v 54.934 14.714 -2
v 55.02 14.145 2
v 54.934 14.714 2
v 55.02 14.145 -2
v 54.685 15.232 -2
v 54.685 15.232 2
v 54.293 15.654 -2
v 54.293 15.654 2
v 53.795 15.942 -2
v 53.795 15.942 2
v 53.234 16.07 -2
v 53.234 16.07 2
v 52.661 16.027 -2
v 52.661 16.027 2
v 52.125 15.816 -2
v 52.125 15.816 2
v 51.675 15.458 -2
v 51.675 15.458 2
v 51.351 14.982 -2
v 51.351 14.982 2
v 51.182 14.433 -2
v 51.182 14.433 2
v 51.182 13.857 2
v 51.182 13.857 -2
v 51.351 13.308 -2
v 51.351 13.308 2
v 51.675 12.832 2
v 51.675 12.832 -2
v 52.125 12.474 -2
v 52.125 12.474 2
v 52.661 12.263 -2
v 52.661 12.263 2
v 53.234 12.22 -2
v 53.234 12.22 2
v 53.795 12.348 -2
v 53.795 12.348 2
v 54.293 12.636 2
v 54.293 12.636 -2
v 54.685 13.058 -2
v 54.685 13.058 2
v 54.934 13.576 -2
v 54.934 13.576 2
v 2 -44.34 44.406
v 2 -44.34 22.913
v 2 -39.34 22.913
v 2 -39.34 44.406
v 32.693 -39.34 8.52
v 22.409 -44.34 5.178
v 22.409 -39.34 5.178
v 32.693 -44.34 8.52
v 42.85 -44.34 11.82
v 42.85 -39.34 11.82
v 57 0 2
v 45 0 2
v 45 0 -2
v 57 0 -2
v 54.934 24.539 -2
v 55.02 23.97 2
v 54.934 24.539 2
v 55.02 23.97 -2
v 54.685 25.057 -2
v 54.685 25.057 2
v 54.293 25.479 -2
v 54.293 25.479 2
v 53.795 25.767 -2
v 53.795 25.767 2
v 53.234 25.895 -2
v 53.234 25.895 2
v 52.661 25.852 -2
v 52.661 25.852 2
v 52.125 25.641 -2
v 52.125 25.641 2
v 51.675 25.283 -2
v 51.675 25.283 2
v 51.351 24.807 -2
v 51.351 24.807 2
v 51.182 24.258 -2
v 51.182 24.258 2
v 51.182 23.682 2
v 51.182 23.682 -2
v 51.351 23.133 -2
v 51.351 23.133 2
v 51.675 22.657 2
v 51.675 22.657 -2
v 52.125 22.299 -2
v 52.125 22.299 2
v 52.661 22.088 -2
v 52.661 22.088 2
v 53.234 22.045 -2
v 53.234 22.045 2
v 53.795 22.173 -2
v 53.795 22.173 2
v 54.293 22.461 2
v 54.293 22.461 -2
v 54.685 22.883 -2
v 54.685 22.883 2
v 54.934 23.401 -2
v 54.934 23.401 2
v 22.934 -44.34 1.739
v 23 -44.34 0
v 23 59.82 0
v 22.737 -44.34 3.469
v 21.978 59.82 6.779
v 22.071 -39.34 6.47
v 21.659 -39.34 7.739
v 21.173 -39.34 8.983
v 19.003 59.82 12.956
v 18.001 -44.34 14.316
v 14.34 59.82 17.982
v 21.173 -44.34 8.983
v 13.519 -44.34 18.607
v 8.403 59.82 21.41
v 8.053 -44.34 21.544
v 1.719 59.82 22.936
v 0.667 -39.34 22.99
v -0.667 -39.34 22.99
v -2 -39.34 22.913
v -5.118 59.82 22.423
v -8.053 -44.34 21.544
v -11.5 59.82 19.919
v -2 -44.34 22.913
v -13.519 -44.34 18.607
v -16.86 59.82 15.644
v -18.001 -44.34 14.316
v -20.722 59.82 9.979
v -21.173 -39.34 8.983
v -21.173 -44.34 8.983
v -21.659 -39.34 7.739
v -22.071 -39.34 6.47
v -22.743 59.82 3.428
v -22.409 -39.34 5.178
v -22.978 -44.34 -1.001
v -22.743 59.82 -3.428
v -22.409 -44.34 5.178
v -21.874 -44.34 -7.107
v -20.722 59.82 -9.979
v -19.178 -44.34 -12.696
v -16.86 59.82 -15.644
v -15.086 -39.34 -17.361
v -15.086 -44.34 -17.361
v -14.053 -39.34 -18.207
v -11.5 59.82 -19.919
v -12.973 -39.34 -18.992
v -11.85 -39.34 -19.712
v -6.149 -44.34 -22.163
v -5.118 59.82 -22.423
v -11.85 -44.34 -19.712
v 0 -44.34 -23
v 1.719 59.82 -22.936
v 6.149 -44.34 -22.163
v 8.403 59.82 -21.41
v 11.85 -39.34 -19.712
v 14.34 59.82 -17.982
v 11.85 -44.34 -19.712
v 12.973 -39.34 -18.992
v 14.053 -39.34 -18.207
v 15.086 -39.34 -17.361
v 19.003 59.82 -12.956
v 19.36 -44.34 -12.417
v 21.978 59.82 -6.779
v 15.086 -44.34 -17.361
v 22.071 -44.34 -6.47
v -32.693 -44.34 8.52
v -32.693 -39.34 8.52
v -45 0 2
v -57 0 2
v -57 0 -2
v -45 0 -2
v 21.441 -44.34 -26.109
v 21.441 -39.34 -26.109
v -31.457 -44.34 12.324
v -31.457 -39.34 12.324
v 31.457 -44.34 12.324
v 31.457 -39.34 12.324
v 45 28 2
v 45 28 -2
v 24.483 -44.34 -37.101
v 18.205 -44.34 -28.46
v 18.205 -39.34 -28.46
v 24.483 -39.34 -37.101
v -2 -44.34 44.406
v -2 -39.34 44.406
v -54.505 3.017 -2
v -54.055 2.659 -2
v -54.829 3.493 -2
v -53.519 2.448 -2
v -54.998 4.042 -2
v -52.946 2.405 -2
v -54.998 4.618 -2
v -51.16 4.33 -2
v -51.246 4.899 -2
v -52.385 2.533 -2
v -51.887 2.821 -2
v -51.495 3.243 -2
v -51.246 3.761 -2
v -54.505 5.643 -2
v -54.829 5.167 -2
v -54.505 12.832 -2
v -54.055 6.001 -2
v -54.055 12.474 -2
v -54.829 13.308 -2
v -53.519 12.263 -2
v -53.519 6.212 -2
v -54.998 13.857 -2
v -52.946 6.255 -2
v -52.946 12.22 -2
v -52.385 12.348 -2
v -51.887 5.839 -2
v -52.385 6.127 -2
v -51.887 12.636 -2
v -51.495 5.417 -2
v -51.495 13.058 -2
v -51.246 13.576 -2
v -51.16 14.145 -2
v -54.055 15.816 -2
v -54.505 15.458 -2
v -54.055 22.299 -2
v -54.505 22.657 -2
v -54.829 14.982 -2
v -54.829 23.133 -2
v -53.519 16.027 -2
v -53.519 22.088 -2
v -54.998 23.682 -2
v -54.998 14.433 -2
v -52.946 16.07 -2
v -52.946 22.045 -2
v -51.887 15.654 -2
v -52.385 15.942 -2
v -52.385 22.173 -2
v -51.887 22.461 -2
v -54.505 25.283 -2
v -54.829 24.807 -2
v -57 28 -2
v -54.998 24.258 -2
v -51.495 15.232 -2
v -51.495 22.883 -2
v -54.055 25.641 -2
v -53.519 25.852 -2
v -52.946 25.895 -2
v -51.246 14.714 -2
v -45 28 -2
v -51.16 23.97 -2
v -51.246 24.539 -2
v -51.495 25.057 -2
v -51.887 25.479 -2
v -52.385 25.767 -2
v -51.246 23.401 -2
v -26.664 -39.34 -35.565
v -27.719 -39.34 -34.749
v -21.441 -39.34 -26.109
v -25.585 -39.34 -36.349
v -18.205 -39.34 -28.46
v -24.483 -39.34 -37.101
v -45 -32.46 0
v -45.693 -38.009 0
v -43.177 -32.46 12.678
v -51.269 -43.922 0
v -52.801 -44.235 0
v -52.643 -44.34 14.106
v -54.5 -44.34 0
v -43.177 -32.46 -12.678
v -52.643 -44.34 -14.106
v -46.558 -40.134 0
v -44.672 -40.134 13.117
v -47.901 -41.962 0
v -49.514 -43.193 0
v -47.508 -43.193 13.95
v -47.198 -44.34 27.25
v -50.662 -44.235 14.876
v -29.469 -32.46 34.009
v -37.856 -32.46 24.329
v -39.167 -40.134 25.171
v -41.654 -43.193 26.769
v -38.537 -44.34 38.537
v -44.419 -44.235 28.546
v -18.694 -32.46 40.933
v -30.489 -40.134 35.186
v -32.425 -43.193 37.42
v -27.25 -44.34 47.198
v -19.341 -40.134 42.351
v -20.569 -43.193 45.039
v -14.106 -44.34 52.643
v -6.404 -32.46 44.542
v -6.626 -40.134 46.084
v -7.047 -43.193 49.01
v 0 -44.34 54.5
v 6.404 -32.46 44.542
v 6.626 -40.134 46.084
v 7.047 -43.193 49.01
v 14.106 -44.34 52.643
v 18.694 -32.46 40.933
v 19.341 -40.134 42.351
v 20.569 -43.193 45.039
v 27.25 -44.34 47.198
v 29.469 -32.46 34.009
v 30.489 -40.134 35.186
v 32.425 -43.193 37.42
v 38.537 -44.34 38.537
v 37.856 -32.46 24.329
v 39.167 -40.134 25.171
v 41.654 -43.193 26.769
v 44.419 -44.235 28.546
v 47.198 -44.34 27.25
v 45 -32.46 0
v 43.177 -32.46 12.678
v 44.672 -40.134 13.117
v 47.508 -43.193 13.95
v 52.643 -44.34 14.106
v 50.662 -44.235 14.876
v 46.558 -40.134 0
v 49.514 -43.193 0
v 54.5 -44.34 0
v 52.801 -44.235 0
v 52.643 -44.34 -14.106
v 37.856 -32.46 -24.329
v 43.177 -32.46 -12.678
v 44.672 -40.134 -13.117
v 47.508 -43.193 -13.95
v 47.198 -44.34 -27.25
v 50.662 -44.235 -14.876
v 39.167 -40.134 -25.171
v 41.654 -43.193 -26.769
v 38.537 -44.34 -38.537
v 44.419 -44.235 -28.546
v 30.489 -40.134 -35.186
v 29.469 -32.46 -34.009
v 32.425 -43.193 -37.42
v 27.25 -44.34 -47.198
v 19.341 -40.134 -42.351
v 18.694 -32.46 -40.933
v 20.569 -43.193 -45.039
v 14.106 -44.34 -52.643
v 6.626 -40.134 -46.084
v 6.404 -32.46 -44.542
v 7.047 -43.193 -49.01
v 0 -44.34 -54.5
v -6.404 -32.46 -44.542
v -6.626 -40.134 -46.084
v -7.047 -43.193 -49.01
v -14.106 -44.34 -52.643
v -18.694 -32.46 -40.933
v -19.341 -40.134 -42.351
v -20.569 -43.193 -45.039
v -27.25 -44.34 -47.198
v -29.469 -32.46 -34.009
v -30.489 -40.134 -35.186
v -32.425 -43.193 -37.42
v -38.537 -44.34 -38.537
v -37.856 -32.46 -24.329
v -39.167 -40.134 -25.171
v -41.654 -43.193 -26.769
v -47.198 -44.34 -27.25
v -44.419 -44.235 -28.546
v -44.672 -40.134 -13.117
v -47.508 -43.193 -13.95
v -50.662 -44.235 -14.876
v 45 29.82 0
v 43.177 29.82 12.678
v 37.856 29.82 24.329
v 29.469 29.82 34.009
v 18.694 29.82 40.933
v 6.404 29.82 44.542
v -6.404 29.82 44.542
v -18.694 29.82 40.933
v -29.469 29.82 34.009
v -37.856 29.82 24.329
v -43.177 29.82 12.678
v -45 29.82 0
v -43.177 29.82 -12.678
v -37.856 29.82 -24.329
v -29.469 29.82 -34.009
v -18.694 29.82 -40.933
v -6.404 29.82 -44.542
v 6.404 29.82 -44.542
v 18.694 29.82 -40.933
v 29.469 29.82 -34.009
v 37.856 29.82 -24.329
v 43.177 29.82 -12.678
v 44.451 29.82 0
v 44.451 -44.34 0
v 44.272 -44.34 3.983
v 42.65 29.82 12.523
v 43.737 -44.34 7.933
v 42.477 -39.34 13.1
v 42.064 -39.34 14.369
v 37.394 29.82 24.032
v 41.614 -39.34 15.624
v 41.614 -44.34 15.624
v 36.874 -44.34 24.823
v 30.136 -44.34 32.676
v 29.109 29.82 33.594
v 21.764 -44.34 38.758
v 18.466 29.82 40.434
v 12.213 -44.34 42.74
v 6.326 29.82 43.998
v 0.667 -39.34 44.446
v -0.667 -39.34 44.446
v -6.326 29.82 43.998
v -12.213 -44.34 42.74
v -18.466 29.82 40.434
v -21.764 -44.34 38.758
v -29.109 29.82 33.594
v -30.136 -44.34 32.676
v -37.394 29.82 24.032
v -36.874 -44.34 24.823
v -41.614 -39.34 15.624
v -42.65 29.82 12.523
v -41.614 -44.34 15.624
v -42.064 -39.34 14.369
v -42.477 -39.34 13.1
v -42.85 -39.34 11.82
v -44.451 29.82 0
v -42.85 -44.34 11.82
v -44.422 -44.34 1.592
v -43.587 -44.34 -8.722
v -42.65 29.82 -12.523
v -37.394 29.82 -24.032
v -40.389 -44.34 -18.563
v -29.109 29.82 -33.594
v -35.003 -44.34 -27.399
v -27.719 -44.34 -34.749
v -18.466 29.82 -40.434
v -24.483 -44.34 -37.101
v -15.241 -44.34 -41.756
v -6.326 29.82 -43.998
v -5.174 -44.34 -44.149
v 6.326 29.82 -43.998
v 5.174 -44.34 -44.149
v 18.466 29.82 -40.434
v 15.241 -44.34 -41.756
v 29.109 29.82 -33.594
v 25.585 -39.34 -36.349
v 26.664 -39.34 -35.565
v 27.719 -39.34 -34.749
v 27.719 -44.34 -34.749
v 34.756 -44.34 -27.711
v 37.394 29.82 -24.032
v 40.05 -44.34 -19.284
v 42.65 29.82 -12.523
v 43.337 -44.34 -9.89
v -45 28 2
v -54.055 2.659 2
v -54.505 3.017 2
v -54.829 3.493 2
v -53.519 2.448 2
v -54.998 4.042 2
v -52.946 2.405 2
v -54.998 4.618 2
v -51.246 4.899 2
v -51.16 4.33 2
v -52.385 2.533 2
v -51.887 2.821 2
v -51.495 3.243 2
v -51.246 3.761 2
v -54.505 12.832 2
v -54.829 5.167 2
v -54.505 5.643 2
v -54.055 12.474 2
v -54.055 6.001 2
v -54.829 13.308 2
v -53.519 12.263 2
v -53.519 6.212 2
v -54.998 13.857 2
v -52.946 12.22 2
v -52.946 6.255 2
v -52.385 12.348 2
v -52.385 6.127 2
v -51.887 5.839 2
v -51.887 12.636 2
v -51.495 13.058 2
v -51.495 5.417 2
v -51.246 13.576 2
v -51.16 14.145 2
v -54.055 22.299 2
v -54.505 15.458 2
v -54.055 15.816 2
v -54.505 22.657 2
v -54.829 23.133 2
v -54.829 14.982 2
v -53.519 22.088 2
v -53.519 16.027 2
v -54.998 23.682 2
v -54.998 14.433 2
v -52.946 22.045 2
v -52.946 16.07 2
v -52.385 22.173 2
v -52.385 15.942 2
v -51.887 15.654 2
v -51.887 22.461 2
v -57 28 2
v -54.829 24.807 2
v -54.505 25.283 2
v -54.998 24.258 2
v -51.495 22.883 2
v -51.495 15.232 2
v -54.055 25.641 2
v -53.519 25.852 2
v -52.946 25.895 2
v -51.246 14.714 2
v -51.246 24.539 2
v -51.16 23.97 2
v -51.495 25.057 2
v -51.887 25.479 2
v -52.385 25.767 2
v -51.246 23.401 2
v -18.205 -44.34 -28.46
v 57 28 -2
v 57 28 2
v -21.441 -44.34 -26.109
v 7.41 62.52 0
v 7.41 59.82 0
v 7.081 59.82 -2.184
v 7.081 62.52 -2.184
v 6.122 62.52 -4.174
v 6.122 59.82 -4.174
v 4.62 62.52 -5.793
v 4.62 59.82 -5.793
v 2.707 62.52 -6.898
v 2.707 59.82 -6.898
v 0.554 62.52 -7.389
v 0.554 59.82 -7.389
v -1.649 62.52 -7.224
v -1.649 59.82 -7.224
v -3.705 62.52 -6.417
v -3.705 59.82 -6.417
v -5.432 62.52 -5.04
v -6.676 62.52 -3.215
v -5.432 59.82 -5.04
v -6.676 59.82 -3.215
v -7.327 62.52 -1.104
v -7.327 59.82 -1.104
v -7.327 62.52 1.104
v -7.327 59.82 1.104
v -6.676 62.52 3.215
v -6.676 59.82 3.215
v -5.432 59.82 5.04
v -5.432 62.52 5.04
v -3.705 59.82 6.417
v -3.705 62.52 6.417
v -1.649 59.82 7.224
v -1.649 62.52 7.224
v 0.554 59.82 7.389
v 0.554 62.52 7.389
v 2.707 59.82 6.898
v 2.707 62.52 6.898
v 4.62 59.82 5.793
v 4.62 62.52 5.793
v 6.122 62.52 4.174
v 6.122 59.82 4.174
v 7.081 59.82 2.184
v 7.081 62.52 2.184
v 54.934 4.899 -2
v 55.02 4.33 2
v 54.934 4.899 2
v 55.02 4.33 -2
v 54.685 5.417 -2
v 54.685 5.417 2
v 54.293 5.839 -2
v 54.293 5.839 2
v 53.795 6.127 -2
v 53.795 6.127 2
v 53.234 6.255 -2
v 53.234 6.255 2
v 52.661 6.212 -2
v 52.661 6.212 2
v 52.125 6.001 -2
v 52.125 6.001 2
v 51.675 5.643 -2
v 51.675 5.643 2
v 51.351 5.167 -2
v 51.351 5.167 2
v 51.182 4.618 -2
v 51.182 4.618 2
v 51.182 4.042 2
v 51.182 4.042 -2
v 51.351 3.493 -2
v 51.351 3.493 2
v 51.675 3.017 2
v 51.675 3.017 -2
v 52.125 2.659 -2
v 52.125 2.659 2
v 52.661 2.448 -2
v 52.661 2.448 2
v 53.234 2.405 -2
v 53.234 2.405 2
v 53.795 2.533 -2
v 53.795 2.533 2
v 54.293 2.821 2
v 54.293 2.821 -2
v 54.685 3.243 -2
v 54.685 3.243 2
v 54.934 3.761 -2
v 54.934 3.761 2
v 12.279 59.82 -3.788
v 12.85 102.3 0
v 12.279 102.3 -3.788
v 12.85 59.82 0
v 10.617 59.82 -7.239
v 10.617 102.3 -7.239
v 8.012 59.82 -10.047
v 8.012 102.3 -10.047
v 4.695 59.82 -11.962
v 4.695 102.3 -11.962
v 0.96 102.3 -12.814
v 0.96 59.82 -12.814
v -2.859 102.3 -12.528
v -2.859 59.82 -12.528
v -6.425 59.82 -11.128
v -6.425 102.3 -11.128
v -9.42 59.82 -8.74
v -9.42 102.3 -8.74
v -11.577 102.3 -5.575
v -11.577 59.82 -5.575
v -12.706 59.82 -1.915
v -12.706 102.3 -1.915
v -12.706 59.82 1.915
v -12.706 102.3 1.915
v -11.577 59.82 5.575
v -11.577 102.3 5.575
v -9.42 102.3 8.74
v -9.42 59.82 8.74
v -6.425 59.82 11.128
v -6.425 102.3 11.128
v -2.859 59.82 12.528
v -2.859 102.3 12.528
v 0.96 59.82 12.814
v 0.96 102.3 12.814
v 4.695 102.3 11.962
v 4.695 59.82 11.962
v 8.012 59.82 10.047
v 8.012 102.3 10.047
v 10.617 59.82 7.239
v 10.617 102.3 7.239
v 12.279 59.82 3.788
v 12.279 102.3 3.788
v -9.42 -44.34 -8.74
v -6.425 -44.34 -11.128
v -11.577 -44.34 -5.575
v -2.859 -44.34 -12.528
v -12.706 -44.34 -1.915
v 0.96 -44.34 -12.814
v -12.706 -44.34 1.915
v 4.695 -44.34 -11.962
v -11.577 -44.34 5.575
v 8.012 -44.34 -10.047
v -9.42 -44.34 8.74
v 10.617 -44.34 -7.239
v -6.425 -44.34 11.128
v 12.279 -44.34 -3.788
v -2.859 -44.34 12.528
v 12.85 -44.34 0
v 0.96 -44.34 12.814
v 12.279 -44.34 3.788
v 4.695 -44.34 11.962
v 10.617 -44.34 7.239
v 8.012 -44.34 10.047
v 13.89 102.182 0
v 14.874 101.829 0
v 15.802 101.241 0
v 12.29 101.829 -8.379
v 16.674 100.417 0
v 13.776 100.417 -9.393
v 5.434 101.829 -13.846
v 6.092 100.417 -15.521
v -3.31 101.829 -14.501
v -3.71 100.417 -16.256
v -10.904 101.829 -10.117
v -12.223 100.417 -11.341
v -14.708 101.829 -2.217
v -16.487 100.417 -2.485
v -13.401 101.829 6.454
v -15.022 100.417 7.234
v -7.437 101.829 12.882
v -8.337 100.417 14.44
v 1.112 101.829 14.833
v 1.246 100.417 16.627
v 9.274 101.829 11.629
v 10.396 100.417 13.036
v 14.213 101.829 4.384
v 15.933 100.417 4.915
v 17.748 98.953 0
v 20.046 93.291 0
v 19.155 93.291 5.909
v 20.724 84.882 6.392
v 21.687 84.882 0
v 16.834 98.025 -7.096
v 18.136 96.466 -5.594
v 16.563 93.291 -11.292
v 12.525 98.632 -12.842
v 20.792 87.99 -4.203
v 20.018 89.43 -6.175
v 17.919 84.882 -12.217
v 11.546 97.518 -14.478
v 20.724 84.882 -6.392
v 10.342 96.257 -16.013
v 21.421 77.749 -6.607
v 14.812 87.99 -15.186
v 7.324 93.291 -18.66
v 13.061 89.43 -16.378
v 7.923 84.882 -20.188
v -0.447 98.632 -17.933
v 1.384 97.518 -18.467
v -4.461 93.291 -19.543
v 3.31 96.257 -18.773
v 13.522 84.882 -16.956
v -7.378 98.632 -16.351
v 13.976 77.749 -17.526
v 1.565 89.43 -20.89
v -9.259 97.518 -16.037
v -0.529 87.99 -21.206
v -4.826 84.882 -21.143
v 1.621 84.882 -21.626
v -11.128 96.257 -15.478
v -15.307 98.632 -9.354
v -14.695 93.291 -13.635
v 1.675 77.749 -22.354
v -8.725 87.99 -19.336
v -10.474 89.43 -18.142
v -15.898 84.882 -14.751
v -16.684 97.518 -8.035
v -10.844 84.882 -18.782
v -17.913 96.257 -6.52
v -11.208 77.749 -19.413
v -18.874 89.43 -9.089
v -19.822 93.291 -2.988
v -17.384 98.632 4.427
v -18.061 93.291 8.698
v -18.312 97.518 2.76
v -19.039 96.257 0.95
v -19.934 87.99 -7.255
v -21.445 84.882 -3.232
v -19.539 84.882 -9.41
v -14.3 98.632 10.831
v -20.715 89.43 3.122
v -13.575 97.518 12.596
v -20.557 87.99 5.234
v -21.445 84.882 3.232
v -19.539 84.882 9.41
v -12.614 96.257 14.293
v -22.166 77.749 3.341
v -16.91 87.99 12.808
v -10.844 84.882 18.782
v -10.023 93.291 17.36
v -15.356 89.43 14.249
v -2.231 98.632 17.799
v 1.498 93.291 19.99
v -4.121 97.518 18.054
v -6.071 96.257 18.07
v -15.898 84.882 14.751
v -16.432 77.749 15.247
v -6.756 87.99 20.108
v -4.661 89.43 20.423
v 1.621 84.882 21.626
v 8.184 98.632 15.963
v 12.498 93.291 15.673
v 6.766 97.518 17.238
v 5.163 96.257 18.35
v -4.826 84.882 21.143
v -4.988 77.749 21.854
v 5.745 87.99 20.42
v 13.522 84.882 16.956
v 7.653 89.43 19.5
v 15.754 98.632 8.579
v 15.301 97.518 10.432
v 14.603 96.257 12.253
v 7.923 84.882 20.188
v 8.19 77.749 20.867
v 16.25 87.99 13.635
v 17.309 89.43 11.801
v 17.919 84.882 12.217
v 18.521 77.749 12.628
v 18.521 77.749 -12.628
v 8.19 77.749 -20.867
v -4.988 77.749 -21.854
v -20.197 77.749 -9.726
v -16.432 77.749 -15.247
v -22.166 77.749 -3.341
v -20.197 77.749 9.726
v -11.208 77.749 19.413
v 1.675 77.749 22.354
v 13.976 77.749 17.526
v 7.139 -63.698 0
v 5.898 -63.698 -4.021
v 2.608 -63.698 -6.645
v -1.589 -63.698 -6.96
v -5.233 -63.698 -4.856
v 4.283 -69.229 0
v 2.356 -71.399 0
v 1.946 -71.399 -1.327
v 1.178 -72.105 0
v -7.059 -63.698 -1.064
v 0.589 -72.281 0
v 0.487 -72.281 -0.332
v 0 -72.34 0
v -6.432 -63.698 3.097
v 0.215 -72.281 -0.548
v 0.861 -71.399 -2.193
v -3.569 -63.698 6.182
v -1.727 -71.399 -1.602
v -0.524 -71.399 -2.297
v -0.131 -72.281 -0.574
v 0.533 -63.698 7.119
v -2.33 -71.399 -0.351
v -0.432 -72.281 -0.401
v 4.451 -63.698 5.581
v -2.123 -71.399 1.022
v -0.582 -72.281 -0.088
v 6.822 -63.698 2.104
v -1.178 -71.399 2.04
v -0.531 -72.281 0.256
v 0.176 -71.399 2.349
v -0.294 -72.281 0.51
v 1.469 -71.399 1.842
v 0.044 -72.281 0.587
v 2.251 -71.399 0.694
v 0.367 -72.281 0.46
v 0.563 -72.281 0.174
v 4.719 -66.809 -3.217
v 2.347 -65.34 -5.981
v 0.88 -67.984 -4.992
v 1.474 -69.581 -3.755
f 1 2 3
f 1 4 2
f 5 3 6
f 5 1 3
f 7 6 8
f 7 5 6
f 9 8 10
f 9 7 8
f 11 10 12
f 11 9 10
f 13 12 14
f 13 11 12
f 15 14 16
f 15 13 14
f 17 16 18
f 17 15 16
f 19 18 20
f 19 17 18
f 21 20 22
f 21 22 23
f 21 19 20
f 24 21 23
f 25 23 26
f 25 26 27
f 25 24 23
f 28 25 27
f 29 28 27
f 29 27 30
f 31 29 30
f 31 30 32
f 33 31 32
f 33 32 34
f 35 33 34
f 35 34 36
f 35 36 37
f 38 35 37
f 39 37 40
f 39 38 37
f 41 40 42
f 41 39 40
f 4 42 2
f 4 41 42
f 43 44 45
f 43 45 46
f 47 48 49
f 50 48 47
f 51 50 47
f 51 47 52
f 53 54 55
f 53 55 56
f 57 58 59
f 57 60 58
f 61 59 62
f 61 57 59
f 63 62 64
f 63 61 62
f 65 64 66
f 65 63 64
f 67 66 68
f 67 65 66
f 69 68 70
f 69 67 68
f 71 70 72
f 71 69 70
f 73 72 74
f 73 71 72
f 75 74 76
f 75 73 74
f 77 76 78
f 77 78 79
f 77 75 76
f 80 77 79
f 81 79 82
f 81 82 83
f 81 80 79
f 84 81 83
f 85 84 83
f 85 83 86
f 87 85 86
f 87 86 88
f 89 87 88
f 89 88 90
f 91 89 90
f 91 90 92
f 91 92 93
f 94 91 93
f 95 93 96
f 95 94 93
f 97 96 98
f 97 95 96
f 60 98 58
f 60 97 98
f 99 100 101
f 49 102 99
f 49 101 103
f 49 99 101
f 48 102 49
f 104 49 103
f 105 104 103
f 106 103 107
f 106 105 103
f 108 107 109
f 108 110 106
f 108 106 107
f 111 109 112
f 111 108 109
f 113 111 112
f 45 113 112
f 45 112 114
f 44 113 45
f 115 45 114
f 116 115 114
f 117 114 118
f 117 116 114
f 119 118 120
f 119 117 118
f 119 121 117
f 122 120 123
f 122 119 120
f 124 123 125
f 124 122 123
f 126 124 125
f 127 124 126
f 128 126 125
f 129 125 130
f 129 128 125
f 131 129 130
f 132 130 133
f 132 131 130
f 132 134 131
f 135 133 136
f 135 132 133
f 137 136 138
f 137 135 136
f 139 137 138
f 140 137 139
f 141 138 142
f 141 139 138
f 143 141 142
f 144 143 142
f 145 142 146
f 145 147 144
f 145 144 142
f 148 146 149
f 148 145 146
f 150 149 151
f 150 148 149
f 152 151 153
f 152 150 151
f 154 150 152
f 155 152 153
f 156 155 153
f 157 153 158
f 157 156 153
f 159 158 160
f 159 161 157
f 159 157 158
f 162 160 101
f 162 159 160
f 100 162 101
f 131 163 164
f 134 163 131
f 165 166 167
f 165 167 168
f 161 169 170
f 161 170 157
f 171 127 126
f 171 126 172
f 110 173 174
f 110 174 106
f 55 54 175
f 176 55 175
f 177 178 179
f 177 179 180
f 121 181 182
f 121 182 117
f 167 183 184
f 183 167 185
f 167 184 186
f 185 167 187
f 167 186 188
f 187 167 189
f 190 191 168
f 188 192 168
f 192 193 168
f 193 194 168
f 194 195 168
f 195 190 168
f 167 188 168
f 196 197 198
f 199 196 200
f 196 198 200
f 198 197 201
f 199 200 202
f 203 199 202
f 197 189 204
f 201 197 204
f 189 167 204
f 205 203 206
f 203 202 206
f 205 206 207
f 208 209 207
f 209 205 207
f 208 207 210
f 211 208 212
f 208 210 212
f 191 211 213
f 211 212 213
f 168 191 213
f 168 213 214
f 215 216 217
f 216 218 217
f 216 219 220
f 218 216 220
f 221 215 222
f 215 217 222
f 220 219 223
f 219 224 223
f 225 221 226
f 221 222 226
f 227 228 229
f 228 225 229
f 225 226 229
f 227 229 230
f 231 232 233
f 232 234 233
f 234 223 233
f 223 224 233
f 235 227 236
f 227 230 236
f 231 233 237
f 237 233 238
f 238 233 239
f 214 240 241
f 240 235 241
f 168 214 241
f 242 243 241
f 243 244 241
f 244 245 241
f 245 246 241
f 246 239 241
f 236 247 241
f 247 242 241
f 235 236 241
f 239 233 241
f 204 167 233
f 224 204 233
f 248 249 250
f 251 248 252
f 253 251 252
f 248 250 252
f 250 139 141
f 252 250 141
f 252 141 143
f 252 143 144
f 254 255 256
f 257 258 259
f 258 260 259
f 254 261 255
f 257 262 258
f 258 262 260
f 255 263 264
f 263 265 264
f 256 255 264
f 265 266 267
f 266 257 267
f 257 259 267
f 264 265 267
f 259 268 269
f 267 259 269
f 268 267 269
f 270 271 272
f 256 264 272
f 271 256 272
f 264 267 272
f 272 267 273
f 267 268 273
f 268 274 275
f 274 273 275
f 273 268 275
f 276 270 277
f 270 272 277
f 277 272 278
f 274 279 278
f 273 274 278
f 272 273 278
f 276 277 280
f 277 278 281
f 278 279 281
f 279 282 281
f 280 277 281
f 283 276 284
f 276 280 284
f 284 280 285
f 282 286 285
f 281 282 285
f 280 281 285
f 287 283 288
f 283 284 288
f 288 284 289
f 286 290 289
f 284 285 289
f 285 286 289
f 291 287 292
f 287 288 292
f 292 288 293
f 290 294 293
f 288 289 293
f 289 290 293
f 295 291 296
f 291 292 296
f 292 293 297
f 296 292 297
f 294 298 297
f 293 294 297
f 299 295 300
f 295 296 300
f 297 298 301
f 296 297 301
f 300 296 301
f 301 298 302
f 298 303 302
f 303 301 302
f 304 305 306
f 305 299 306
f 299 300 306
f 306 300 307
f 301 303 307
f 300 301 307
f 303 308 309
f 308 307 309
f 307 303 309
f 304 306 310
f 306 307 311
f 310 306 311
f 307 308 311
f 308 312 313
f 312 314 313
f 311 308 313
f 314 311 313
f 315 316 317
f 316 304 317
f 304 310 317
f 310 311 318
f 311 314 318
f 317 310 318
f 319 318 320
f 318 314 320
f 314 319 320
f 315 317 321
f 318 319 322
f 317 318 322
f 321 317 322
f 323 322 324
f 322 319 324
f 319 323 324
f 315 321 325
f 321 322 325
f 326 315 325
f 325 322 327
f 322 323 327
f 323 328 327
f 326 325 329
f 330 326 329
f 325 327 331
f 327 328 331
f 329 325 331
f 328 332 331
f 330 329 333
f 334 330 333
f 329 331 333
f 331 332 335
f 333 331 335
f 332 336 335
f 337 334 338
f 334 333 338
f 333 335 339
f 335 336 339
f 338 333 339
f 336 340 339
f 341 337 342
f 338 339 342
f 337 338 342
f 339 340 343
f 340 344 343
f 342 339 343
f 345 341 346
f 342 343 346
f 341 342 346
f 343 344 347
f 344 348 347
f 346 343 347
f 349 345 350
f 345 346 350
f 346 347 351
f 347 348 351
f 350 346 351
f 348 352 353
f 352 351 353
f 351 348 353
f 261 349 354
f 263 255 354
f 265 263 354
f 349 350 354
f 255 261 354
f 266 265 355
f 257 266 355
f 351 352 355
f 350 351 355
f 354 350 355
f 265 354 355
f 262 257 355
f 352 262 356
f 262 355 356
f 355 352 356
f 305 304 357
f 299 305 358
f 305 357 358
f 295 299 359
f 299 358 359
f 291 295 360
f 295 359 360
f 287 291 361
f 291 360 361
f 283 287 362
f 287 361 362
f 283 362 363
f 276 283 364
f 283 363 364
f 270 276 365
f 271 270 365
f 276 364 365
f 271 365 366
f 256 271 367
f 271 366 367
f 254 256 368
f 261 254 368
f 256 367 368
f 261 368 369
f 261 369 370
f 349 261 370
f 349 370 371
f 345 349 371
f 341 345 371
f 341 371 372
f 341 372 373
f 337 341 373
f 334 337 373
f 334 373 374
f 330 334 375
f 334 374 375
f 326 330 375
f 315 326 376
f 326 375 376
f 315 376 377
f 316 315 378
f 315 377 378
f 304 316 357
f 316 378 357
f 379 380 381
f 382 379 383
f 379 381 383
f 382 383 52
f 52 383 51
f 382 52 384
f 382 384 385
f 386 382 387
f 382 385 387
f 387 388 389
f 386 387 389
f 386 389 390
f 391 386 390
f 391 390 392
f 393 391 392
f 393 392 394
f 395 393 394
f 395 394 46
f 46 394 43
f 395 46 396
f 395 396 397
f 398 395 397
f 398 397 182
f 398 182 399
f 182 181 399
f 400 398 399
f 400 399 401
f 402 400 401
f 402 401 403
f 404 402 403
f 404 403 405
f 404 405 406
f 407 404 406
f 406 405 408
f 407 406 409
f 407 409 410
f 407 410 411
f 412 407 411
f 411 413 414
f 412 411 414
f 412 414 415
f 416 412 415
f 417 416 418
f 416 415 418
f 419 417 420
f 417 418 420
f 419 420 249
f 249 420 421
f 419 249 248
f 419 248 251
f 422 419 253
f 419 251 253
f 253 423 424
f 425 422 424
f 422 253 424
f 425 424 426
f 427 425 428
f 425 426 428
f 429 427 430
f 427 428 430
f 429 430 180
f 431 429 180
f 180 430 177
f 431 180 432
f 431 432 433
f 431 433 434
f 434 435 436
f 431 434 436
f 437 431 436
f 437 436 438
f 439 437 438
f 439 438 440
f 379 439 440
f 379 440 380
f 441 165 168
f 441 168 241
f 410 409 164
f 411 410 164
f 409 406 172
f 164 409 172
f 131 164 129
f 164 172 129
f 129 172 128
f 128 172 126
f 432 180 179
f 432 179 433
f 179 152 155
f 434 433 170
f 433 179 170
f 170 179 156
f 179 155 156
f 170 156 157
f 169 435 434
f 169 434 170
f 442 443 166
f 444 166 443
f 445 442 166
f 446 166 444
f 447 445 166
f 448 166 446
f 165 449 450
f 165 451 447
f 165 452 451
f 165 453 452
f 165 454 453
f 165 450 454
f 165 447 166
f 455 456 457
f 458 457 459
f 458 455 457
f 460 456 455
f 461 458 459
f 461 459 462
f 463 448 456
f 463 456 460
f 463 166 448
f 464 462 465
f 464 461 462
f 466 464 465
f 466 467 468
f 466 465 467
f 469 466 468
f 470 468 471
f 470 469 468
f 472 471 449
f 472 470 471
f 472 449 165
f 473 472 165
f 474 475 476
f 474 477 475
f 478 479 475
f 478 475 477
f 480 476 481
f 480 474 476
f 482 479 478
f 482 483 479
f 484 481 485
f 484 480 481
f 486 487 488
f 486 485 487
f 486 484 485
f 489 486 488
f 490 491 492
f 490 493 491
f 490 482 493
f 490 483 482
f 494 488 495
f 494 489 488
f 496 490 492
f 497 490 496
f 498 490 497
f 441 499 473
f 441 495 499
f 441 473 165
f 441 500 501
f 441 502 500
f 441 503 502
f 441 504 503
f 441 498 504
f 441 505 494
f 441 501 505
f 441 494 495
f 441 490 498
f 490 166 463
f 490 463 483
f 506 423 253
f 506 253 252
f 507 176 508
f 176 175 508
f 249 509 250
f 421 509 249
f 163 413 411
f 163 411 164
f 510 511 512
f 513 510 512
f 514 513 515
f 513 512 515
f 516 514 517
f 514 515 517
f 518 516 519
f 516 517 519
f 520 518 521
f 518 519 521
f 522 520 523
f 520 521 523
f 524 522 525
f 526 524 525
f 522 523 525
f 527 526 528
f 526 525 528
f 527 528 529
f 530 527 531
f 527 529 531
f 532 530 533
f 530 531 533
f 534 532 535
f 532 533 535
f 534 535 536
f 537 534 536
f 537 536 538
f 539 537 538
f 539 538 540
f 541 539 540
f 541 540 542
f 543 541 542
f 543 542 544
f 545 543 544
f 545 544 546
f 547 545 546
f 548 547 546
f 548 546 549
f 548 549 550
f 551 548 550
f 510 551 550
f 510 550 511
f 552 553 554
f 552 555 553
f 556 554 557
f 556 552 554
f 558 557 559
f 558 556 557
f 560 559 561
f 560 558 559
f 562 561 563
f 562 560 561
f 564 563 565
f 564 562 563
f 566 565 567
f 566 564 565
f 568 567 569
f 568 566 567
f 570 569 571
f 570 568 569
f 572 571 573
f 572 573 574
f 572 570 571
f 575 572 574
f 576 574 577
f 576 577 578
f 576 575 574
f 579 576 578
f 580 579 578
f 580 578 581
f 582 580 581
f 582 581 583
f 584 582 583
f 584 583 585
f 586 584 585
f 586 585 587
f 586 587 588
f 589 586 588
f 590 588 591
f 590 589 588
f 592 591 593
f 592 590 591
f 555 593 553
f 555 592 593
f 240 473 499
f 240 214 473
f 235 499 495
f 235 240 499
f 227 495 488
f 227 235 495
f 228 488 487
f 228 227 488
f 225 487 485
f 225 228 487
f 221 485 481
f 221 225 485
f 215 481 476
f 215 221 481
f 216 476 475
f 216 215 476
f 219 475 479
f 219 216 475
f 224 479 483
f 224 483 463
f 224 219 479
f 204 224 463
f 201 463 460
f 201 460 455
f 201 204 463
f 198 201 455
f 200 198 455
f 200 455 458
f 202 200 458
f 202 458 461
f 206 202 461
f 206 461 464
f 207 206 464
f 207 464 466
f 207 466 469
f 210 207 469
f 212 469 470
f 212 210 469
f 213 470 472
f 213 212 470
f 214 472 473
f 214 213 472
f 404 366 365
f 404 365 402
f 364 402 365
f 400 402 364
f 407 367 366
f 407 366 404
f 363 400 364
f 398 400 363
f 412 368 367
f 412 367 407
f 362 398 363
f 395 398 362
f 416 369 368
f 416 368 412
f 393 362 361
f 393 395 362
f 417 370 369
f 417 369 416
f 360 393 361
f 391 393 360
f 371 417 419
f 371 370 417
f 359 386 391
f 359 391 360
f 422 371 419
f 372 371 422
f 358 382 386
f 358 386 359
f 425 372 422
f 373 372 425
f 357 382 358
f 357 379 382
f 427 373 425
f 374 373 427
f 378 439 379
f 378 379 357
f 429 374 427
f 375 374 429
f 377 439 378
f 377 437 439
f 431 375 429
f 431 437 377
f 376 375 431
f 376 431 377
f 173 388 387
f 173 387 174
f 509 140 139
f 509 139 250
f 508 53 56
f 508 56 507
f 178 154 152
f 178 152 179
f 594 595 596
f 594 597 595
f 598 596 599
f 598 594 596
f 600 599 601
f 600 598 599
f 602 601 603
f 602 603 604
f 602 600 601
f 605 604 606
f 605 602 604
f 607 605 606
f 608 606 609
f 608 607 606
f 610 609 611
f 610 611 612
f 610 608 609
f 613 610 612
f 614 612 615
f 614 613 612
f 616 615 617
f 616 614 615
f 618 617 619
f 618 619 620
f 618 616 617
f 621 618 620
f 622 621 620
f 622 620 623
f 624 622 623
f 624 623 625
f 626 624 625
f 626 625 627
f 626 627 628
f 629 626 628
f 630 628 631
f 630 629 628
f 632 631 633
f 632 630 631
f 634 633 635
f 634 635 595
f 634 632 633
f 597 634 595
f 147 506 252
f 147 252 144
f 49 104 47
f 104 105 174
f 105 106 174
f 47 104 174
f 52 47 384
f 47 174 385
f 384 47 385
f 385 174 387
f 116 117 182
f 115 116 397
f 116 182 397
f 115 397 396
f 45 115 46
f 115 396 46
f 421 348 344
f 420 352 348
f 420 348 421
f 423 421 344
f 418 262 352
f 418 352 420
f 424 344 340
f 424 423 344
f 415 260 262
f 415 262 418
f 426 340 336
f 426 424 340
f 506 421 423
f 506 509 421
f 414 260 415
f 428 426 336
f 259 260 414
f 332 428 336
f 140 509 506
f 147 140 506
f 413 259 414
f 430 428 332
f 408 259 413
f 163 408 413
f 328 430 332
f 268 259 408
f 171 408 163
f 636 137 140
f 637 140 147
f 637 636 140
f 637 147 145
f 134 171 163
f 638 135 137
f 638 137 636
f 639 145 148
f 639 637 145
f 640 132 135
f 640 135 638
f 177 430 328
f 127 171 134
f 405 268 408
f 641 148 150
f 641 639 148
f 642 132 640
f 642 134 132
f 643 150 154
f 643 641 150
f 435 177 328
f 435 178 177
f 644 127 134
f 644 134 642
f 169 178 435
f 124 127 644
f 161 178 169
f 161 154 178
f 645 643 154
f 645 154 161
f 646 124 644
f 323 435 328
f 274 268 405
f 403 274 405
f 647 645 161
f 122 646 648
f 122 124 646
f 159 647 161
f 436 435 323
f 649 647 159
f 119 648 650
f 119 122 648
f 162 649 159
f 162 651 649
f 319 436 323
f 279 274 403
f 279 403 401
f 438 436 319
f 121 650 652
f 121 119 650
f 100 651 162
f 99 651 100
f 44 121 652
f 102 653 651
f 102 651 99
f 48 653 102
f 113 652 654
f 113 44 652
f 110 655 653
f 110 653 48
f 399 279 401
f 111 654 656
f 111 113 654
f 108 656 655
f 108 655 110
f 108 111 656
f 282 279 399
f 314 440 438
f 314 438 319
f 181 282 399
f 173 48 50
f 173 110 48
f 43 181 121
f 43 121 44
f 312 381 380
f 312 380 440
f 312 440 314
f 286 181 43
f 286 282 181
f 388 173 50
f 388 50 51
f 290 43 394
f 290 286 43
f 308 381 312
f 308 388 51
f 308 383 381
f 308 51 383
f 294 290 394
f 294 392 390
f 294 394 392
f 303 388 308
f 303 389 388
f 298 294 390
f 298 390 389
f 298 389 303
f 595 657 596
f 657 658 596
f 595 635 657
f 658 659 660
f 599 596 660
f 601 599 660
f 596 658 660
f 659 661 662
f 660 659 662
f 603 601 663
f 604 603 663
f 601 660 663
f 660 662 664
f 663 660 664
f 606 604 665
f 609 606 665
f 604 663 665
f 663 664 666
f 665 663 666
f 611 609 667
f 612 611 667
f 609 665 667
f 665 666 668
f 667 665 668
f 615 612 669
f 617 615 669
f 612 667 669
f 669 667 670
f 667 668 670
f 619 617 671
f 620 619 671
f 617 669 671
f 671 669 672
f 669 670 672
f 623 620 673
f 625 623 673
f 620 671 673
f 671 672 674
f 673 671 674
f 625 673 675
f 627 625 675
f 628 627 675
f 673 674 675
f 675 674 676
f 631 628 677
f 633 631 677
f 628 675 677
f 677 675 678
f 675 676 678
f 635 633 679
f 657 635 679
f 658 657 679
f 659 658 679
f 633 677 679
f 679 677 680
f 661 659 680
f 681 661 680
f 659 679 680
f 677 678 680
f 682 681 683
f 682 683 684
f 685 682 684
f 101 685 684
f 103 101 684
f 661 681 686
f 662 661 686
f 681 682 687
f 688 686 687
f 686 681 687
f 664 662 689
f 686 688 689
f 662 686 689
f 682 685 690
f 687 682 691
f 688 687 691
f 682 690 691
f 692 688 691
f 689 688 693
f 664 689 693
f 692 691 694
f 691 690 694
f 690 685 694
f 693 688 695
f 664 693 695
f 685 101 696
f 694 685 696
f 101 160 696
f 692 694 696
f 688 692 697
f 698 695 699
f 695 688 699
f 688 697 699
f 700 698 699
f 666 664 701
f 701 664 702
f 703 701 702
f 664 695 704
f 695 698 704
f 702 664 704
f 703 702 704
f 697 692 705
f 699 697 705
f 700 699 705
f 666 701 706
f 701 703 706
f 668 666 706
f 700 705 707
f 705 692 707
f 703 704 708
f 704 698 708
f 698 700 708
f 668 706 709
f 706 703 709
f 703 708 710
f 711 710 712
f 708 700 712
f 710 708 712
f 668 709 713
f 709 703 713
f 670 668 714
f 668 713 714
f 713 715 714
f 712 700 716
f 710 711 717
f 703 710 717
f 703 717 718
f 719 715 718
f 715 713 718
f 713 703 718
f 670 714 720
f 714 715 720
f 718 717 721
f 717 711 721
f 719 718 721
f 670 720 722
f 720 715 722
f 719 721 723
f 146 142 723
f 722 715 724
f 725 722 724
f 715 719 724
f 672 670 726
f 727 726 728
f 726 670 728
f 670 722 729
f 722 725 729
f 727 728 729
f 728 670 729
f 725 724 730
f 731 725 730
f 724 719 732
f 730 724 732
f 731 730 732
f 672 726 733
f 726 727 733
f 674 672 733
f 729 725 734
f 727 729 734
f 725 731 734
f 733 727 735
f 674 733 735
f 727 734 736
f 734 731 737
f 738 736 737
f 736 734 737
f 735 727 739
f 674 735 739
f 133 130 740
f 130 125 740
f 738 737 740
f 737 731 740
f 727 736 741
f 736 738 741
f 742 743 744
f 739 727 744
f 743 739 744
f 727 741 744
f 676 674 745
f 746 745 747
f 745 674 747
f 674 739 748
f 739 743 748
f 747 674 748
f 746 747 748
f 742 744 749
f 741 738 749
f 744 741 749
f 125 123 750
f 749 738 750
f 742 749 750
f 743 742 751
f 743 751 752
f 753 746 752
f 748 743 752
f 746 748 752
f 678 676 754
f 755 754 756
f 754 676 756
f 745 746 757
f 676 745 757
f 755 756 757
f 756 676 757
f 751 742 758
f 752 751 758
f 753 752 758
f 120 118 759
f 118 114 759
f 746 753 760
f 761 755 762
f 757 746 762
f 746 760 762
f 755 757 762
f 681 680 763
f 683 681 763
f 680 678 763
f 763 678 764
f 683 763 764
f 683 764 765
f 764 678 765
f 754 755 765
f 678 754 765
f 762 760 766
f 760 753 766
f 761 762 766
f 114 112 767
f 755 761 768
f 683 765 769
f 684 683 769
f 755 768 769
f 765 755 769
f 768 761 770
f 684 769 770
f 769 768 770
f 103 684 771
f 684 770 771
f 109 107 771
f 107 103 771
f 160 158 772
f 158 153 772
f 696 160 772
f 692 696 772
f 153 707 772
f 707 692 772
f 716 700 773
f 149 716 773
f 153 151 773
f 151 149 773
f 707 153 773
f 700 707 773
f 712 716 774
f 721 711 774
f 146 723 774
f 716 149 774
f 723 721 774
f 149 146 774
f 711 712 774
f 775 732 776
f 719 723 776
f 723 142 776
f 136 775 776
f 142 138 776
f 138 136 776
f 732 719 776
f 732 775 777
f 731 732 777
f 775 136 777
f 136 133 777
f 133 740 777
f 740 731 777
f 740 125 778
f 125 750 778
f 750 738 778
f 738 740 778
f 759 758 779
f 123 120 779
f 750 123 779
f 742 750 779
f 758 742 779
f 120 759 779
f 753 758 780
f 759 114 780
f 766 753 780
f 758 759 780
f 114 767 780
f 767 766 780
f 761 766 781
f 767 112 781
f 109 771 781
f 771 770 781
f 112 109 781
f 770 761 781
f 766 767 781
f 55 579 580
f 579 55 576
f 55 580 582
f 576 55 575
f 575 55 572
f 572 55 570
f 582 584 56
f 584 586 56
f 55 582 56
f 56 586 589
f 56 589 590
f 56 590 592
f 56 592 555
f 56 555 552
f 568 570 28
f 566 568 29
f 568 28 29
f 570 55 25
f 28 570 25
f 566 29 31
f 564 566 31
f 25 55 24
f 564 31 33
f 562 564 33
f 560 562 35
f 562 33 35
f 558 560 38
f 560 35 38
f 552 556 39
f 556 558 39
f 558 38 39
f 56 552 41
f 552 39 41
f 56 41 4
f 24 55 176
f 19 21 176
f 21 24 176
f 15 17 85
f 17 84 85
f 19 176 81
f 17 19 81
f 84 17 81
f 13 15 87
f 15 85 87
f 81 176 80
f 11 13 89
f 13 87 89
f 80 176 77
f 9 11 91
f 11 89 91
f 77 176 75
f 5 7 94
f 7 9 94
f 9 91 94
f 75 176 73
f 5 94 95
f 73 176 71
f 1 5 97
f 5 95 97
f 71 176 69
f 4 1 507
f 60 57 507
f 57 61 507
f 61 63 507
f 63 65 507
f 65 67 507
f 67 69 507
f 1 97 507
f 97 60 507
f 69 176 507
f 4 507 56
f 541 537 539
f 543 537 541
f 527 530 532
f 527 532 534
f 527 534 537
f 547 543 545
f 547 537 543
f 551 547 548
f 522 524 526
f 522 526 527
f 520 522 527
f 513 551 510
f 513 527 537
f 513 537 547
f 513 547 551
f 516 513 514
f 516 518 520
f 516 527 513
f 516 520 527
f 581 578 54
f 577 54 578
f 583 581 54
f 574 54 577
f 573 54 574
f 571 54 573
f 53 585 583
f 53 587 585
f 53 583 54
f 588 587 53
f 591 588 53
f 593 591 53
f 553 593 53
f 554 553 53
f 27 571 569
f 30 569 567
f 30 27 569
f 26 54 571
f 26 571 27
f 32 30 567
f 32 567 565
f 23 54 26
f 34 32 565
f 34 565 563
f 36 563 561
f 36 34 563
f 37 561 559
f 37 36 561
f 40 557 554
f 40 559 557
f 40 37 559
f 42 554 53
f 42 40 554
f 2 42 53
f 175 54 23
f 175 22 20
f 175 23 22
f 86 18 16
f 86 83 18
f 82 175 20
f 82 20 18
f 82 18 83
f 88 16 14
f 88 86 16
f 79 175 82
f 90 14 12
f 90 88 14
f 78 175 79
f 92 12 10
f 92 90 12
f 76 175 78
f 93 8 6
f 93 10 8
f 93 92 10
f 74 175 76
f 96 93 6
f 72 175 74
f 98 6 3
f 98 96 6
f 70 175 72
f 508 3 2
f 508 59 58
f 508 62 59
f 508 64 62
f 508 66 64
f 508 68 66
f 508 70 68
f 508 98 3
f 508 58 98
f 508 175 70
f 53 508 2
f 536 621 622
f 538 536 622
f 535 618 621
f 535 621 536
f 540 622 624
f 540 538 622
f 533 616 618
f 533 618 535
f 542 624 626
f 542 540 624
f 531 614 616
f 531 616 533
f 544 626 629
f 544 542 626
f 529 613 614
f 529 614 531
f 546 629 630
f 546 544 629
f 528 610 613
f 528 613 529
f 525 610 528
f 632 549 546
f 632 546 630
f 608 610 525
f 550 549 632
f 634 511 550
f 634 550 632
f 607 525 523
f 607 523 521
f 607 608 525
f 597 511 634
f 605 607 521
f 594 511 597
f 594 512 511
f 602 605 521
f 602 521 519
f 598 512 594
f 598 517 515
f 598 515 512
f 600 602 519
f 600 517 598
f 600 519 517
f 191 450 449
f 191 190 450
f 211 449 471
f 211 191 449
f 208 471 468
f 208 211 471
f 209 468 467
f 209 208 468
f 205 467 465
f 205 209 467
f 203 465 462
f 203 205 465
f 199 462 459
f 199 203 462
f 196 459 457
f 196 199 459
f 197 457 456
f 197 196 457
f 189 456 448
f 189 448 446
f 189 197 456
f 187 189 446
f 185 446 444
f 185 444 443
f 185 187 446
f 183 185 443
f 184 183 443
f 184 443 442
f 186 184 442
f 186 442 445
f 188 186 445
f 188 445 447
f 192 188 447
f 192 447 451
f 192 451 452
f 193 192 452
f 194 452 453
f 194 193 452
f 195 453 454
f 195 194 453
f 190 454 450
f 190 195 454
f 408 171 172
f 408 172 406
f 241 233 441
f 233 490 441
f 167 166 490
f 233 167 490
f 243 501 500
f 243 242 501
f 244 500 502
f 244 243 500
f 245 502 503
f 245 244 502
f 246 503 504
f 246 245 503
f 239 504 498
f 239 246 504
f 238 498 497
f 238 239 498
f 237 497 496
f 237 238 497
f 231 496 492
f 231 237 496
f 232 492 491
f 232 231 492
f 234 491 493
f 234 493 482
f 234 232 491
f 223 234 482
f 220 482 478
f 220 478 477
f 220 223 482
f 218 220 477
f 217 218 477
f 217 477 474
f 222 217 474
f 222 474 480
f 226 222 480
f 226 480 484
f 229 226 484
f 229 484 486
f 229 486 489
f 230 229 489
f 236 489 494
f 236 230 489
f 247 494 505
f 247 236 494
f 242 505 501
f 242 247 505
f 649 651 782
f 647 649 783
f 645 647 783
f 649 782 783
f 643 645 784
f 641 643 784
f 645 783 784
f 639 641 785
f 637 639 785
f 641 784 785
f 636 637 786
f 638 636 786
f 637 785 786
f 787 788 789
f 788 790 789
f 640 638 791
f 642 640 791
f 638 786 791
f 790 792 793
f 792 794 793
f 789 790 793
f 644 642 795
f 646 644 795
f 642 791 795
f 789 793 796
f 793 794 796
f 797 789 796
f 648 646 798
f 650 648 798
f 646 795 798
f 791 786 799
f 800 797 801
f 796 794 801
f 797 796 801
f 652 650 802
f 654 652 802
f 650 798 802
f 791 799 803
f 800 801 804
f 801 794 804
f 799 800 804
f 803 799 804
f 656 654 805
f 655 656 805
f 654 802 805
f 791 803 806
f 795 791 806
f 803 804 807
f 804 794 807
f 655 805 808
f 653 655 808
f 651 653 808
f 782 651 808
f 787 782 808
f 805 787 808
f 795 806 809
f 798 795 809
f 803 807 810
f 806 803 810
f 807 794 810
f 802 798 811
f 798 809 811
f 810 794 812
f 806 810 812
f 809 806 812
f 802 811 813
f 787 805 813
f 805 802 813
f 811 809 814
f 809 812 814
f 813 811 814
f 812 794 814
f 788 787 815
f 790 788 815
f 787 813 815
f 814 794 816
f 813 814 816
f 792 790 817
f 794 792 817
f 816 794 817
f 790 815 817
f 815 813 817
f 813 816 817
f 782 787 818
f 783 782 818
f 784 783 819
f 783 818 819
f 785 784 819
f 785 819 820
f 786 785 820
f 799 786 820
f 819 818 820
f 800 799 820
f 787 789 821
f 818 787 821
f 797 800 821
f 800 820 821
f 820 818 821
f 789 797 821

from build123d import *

# Parameters (mm, degrees)
SKETCH_1_R          = 45
EXTRUDE_1_DEPTH     = 29.82
SKETCH_2_W          = 12
SKETCH_2_H          = 28
SKETCH_2_R          = 1.93
EXTRUDE_2_DEPTH     = 2
EXTRUDE_2_2_DEPTH   = 2
SKETCH_3_R          = 21.35
EXTRUDE_3_DEPTH     = 25.7
SKETCH_4_R          = 7.41
EXTRUDE_4_DEPTH     = 7
SKETCH_5_R          = 45
EXTRUDE_5_DEPTH     = 32.46
SKETCH_7_R          = 23
EXTRUDE_6_DEPTH     = 30
SKETCH_11_R         = 44.450781265
SKETCH_11_R_2       = 23
CUT_EXTRUDE_1_DEPTH = 118.34
EXTRUDE_7_DEPTH     = 5


with BuildPart() as part:
    # 草图1 → 凸台-拉伸1 (new body)
    with BuildSketch(Plane(origin=(0, 0, 0), x_dir=(1, 0, 0), z_dir=(0, 1, 0))):
        Circle(SKETCH_1_R)
    extrude(amount=EXTRUDE_1_DEPTH)

    # 草图3 → 凸台-拉伸3 (add)
    with BuildSketch(Plane(origin=(0, 29.82, 0), x_dir=(1, 0, 0), z_dir=(0, 1, 0))):
        Circle(SKETCH_3_R)
    extrude(amount=EXTRUDE_3_DEPTH)

    # 草图4 → 凸台-拉伸4 (add)
    with BuildSketch(Plane(origin=(0, 55.52, 0), x_dir=(1, 0, 0), z_dir=(0, 1, 0))):
        Circle(SKETCH_4_R)
    extrude(amount=EXTRUDE_4_DEPTH)

    # 草图5 → 凸台-拉伸5 (add)
    with BuildSketch(Plane.XZ):
        Circle(SKETCH_5_R)
    extrude(amount=EXTRUDE_5_DEPTH)

    # 草图6 → 旋转1 (revolve)
    with BuildSketch(Plane.XY):
        with BuildLine():
            Line((-54.5, -44.34), (0, -44.34))
            Line((0, -44.34), (0, -32.46))
            Line((0, -32.46), (-45, -32.46))
            add(Edge.make_bspline(
                [(-45, -32.46), (-45, -44.34), (-54.5, -44.34)],
                knots=[0, 0, 0, 1, 1, 1], degree=2))
        make_face()
    revolve(axis=Axis((0, -44.34, 0), (0, 1, 0)))

    # 草图7 → 凸台-拉伸6 (add)
    with BuildSketch(Plane(origin=(0, 29.82, 0), x_dir=(1, 0, 0), z_dir=(0, 1, 0))):
        Circle(SKETCH_7_R)
    extrude(amount=EXTRUDE_6_DEPTH)

    # 草图8 → 旋转2 (revolve)
    with BuildSketch(Plane.XY):
        with BuildLine():
            Line((12.85, 102.3), (12.85, 59.82))
            Line((12.85, 59.82), (23, 59.82))
            add(Edge.make_bspline(
                [(12.85, 102.3), (23, 102.3), (23, 59.82)],
                knots=[0, 0, 0, 1, 1, 1], degree=2))
        make_face()
    revolve(axis=Axis((0, 59.82, 0), (0, 1, 0)))

    # 草图10 → 旋转3 (revolve)
    with BuildSketch(Plane.XY):
        with BuildLine():
            Line((0, -72.34), (0, -44.34))
            Line((0, -44.34), (12.85, -44.34))
            add(Edge.make_bspline(
                [(12.85, -44.34), (6.425, -72.34), (0, -72.34)],
                knots=[0, 0, 0, 1, 1, 1], degree=2))
        make_face()
    revolve(axis=Axis((0, -72.34, 0), (0, 1, 0)))

    # 草图11 → 切除-拉伸1 (cut)
    with BuildSketch(Plane.XZ.offset(44.34)):
        Circle(SKETCH_11_R)
        Circle(SKETCH_11_R_2, mode=Mode.SUBTRACT)
    extrude(amount=-CUT_EXTRUDE_1_DEPTH, mode=Mode.SUBTRACT)

    # 草图12 → 凸台-拉伸7 (add)
    with BuildSketch(Plane.XZ.offset(44.34)):
        with BuildLine():
            Line((2, 33.725390633), (2, 44.405764886))
            ThreePointArc((2, 44.405764886), (0, 44.450781265), (-2, 44.405764886))
            Line((-2, 44.405764886), (-2, 33.725390633))
            Line((-2, 33.725390633), (-2, 22.912878475))
            Line((-2, 22.912878475), (2, 22.912878475))
            Line((2, 22.912878475), (2, 33.725390633))
        make_face()
        with BuildLine():
            Line((21.173408392, 8.982581871), (22.409476369, 5.178355806))
            Line((22.409476369, 5.178355806), (32.692786515, 8.519605815))
            Line((32.692786515, 8.519605815), (42.850426045, 11.820022965))
            ThreePointArc((42.850426045, 11.820022965), (42.275205177, 13.736046824), (41.614358067, 15.624249031))
            Line((41.614358067, 15.624249031), (31.456718537, 12.32383188))
            Line((31.456718537, 12.32383188), (21.173408392, 8.982581871))
        make_face()
        with BuildLine():
            Line((15.085886044, -17.361337572), (11.849818066, -19.712478581))
            Line((11.849818066, -19.712478581), (18.205253253, -28.459984668))
            Line((18.205253253, -28.459984668), (24.483019728, -37.100588946))
            ThreePointArc((24.483019728, -37.100588946), (26.127513681, -35.961437457), (27.719087706, -34.749447936))
            Line((27.719087706, -34.749447936), (21.44132123, -26.108843659))
            Line((21.44132123, -26.108843659), (15.085886044, -17.361337572))
        make_face()
        with BuildLine():
            Line((-11.849818066, -19.712478581), (-15.085886044, -17.361337572))
            Line((-15.085886044, -17.361337572), (-21.44132123, -26.108843659))
            Line((-21.44132123, -26.108843659), (-27.719087706, -34.749447936))
            ThreePointArc((-27.719087706, -34.749447936), (-26.127513681, -35.961437457), (-24.483019728, -37.100588946))
            Line((-24.483019728, -37.100588946), (-18.205253253, -28.459984668))
            Line((-18.205253253, -28.459984668), (-11.849818066, -19.712478581))
        make_face()
        with BuildLine():
            Line((-22.409476369, 5.178355806), (-21.173408392, 8.982581871))
            Line((-21.173408392, 8.982581871), (-31.456718537, 12.32383188))
            Line((-31.456718537, 12.32383188), (-41.614358067, 15.624249031))
            ThreePointArc((-41.614358067, 15.624249031), (-42.275205177, 13.736046824), (-42.850426045, 11.820022965))
            Line((-42.850426045, 11.820022965), (-32.692786515, 8.519605815))
            Line((-32.692786515, 8.519605815), (-22.409476369, 5.178355806))
        make_face()
    extrude(amount=-EXTRUDE_7_DEPTH)


with BuildPart() as body_2:
    # 草图2 → 凸台-拉伸2 (new body, symmetric)
    with BuildSketch(Plane.XY):
        with Locations((51, 14)):
            Rectangle(SKETCH_2_W, SKETCH_2_H)
        with Locations((53.09, 23.97)):
            Circle(SKETCH_2_R, mode=Mode.SUBTRACT)
        with Locations((53.09, 14.145)):
            Circle(SKETCH_2_R, mode=Mode.SUBTRACT)
        with Locations((53.09, 4.33)):
            Circle(SKETCH_2_R, mode=Mode.SUBTRACT)
    extrude(amount=EXTRUDE_2_DEPTH, both=True)


with BuildPart() as body_3:
    # 草图2 → Extrude 2 2 (new body, symmetric)
    with BuildSketch(Plane.XY):
        with Locations((-51, 14)):
            Rectangle(SKETCH_2_W, SKETCH_2_H)
        with Locations((-53.09, 4.33)):
            Circle(SKETCH_2_R, mode=Mode.SUBTRACT)
        with Locations((-53.09, 14.145)):
            Circle(SKETCH_2_R, mode=Mode.SUBTRACT)
        with Locations((-53.09, 23.97)):
            Circle(SKETCH_2_R, mode=Mode.SUBTRACT)
    extrude(amount=EXTRUDE_2_2_DEPTH, both=True)


solid = Compound([part.part, body_2.part, body_3.part])
